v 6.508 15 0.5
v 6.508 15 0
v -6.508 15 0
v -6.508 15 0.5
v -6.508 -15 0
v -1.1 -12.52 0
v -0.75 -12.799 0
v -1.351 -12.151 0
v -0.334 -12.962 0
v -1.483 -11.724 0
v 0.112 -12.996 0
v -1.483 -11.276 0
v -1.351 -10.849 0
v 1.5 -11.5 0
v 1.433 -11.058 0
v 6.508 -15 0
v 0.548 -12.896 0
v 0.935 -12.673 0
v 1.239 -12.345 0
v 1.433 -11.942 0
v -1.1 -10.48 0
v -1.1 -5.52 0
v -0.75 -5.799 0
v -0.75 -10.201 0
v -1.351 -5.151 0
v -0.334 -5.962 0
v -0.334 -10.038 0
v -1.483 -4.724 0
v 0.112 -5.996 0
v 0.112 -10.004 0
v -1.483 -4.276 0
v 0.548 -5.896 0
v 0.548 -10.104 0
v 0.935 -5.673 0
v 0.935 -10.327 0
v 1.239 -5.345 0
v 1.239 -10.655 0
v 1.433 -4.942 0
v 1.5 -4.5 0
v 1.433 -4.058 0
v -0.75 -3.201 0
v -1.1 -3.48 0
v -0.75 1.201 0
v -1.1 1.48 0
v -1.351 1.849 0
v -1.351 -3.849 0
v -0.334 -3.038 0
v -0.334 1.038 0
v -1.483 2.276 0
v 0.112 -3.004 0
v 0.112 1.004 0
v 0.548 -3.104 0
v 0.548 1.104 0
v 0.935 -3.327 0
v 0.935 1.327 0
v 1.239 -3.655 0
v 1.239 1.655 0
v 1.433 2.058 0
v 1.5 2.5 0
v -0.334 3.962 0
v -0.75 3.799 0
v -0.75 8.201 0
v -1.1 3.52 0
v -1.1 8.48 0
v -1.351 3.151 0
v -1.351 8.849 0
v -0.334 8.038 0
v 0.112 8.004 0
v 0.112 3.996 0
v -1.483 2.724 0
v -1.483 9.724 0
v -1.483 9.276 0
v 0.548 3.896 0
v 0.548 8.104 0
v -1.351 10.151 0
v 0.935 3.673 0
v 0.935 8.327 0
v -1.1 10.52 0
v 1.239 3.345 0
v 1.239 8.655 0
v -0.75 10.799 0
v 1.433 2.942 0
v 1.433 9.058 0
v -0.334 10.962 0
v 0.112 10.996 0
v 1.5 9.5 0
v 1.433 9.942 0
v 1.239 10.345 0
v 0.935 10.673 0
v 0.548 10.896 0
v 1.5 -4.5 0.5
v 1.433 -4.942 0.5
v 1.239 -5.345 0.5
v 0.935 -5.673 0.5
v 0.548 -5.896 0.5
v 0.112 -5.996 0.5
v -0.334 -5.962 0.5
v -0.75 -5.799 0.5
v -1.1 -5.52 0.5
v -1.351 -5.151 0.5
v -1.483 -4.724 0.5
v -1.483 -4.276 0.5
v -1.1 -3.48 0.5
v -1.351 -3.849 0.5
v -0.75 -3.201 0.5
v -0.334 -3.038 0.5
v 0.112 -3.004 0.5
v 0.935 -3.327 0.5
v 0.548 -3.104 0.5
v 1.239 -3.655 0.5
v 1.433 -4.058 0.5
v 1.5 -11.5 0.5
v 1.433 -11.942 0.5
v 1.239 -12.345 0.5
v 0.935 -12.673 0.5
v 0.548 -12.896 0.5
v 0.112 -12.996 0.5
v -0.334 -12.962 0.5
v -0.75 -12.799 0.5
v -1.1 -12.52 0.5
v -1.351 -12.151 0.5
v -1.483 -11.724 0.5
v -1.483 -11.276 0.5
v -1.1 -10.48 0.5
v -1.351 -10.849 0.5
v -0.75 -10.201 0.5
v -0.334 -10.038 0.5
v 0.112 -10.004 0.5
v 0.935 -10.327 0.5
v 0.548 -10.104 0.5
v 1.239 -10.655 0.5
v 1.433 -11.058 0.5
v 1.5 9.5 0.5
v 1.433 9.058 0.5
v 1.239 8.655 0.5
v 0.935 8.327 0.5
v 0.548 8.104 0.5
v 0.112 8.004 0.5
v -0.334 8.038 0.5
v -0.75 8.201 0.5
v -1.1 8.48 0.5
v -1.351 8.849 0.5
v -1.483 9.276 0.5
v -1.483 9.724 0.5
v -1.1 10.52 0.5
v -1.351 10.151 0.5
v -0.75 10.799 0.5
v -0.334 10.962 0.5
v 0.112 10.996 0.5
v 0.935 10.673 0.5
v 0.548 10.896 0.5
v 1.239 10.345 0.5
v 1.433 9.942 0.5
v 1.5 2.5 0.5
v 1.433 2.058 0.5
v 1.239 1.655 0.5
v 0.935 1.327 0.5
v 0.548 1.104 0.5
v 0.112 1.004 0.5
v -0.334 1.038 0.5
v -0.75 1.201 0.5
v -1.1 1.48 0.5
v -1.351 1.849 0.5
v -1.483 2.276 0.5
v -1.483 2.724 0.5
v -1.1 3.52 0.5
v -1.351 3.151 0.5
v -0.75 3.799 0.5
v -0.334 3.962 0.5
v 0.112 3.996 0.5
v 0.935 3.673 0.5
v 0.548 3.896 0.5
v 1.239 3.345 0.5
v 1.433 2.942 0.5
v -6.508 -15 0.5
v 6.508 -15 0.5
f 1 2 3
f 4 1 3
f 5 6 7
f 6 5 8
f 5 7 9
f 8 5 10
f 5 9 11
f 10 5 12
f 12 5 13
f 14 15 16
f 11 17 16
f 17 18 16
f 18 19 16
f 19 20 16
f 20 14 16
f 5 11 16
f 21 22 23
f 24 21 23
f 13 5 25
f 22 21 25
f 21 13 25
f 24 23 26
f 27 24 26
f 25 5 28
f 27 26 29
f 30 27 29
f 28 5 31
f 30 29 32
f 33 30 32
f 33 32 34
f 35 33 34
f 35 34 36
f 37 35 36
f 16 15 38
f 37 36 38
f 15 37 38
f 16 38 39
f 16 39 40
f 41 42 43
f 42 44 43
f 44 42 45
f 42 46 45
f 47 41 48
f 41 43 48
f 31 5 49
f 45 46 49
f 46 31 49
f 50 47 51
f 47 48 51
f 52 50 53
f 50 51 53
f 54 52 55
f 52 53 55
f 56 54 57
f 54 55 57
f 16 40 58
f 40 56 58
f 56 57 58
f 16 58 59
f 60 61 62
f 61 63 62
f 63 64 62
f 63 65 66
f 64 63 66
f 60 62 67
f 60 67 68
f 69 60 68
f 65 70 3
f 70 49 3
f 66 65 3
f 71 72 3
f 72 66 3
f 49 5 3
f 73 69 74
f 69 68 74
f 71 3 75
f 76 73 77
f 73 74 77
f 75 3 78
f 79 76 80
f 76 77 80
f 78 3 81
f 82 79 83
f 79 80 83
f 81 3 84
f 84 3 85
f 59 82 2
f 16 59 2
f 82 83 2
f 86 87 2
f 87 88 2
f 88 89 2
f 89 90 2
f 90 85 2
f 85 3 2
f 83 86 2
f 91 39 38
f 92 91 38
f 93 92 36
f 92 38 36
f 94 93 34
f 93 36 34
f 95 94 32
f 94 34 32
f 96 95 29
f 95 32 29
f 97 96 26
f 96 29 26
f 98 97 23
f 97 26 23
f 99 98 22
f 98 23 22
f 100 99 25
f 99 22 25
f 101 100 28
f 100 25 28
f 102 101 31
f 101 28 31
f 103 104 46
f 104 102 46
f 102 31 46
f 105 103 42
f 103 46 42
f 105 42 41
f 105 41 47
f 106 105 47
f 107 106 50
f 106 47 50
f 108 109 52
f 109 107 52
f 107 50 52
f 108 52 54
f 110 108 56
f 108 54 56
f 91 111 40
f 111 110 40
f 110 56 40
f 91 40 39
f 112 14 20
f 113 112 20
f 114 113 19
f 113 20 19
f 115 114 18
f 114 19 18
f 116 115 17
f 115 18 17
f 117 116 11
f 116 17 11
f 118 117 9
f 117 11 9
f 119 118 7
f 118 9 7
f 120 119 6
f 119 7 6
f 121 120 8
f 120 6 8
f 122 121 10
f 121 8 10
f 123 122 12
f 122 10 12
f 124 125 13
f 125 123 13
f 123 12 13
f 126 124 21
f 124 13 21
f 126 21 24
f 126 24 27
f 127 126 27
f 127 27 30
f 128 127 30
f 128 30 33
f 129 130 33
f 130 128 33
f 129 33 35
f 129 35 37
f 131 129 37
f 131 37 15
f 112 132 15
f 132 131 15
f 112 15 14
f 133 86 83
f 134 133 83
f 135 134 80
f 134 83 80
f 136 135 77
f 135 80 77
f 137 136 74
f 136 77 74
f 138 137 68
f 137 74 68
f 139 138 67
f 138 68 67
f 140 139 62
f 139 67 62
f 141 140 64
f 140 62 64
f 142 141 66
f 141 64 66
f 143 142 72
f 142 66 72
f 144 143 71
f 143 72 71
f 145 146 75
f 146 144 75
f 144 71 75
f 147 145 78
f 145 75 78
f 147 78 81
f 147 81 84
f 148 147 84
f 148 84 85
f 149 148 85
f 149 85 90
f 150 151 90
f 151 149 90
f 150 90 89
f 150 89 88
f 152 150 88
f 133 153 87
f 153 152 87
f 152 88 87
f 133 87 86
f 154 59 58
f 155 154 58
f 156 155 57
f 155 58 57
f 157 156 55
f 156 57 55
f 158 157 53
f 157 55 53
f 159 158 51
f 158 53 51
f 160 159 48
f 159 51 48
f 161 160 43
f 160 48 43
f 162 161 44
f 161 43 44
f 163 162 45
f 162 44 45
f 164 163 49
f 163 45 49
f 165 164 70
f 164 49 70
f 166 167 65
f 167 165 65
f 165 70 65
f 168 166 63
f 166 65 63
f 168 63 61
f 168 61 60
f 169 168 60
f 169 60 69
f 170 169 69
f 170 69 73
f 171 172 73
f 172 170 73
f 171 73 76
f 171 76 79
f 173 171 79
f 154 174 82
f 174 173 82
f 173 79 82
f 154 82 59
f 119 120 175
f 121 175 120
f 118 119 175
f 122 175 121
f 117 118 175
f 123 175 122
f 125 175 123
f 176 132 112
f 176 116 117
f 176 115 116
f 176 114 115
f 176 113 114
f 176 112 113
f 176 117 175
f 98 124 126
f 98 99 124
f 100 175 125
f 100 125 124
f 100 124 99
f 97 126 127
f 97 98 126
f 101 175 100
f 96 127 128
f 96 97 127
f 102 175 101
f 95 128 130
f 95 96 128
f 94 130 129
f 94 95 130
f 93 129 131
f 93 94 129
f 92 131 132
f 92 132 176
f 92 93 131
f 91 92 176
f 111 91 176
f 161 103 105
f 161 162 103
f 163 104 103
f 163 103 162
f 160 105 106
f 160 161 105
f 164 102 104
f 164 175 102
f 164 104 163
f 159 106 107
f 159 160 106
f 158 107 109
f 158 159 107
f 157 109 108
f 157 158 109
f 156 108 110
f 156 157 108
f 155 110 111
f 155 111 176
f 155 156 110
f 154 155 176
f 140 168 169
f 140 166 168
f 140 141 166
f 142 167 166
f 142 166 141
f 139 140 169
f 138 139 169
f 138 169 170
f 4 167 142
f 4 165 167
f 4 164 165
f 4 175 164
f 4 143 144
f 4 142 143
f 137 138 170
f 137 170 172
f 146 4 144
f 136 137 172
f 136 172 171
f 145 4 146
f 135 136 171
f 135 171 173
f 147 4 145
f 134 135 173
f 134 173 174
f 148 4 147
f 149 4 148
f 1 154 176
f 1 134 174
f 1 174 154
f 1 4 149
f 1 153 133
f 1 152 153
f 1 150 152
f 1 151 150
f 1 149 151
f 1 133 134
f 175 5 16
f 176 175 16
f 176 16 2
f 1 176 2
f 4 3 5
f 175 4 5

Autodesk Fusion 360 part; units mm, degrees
sketch "Sketch1" plane through (0, 0, 0) normal (0, 0, 1) x (1, 0, 0)
  line L0 (6.508, 15) -> (-6.508, 15)
  line L1 (-6.508, 15) -> (-6.508, -15)
  line L2 (-6.508, -15) -> (6.508, -15)
  line L3 (6.508, -15) -> (6.508, 15)
  line L4 (6.508, 15) -> (-6.508, -15) construction
  line L5 (-6.508, 15) -> (6.508, -15) construction
  line L6 (0, 15) -> (0, -15) construction
  circle A0 centre (0, 13) radius 2
  circle A1 centre (0, 9.5) radius 1.5
  circle A2 centre (0, 6) radius 2
  circle A3 centre (0, 2.5) radius 1.5
  circle A4 centre (0, -1) radius 2
  circle A5 centre (0, -4.5) radius 1.5
  circle A6 centre (0, -8) radius 2
  circle A7 centre (0, -11.5) radius 1.5
  dimension "d1" = 13.016
  dimension "d2" = 30
  dimension "d3" = 4
  dimension "d4" = 3
  dimension "d5" = 4
  dimension "d6" = 3
  dimension "d7" = 4
  dimension "d8" = 3
  dimension "d9" = 4
  dimension "d10" = 3
extrude "Extrude1" add sketch "Sketch1" along normal blind 0.5 contours A6 | A4 | A2 | A0 | L0 L1 L2 L3
